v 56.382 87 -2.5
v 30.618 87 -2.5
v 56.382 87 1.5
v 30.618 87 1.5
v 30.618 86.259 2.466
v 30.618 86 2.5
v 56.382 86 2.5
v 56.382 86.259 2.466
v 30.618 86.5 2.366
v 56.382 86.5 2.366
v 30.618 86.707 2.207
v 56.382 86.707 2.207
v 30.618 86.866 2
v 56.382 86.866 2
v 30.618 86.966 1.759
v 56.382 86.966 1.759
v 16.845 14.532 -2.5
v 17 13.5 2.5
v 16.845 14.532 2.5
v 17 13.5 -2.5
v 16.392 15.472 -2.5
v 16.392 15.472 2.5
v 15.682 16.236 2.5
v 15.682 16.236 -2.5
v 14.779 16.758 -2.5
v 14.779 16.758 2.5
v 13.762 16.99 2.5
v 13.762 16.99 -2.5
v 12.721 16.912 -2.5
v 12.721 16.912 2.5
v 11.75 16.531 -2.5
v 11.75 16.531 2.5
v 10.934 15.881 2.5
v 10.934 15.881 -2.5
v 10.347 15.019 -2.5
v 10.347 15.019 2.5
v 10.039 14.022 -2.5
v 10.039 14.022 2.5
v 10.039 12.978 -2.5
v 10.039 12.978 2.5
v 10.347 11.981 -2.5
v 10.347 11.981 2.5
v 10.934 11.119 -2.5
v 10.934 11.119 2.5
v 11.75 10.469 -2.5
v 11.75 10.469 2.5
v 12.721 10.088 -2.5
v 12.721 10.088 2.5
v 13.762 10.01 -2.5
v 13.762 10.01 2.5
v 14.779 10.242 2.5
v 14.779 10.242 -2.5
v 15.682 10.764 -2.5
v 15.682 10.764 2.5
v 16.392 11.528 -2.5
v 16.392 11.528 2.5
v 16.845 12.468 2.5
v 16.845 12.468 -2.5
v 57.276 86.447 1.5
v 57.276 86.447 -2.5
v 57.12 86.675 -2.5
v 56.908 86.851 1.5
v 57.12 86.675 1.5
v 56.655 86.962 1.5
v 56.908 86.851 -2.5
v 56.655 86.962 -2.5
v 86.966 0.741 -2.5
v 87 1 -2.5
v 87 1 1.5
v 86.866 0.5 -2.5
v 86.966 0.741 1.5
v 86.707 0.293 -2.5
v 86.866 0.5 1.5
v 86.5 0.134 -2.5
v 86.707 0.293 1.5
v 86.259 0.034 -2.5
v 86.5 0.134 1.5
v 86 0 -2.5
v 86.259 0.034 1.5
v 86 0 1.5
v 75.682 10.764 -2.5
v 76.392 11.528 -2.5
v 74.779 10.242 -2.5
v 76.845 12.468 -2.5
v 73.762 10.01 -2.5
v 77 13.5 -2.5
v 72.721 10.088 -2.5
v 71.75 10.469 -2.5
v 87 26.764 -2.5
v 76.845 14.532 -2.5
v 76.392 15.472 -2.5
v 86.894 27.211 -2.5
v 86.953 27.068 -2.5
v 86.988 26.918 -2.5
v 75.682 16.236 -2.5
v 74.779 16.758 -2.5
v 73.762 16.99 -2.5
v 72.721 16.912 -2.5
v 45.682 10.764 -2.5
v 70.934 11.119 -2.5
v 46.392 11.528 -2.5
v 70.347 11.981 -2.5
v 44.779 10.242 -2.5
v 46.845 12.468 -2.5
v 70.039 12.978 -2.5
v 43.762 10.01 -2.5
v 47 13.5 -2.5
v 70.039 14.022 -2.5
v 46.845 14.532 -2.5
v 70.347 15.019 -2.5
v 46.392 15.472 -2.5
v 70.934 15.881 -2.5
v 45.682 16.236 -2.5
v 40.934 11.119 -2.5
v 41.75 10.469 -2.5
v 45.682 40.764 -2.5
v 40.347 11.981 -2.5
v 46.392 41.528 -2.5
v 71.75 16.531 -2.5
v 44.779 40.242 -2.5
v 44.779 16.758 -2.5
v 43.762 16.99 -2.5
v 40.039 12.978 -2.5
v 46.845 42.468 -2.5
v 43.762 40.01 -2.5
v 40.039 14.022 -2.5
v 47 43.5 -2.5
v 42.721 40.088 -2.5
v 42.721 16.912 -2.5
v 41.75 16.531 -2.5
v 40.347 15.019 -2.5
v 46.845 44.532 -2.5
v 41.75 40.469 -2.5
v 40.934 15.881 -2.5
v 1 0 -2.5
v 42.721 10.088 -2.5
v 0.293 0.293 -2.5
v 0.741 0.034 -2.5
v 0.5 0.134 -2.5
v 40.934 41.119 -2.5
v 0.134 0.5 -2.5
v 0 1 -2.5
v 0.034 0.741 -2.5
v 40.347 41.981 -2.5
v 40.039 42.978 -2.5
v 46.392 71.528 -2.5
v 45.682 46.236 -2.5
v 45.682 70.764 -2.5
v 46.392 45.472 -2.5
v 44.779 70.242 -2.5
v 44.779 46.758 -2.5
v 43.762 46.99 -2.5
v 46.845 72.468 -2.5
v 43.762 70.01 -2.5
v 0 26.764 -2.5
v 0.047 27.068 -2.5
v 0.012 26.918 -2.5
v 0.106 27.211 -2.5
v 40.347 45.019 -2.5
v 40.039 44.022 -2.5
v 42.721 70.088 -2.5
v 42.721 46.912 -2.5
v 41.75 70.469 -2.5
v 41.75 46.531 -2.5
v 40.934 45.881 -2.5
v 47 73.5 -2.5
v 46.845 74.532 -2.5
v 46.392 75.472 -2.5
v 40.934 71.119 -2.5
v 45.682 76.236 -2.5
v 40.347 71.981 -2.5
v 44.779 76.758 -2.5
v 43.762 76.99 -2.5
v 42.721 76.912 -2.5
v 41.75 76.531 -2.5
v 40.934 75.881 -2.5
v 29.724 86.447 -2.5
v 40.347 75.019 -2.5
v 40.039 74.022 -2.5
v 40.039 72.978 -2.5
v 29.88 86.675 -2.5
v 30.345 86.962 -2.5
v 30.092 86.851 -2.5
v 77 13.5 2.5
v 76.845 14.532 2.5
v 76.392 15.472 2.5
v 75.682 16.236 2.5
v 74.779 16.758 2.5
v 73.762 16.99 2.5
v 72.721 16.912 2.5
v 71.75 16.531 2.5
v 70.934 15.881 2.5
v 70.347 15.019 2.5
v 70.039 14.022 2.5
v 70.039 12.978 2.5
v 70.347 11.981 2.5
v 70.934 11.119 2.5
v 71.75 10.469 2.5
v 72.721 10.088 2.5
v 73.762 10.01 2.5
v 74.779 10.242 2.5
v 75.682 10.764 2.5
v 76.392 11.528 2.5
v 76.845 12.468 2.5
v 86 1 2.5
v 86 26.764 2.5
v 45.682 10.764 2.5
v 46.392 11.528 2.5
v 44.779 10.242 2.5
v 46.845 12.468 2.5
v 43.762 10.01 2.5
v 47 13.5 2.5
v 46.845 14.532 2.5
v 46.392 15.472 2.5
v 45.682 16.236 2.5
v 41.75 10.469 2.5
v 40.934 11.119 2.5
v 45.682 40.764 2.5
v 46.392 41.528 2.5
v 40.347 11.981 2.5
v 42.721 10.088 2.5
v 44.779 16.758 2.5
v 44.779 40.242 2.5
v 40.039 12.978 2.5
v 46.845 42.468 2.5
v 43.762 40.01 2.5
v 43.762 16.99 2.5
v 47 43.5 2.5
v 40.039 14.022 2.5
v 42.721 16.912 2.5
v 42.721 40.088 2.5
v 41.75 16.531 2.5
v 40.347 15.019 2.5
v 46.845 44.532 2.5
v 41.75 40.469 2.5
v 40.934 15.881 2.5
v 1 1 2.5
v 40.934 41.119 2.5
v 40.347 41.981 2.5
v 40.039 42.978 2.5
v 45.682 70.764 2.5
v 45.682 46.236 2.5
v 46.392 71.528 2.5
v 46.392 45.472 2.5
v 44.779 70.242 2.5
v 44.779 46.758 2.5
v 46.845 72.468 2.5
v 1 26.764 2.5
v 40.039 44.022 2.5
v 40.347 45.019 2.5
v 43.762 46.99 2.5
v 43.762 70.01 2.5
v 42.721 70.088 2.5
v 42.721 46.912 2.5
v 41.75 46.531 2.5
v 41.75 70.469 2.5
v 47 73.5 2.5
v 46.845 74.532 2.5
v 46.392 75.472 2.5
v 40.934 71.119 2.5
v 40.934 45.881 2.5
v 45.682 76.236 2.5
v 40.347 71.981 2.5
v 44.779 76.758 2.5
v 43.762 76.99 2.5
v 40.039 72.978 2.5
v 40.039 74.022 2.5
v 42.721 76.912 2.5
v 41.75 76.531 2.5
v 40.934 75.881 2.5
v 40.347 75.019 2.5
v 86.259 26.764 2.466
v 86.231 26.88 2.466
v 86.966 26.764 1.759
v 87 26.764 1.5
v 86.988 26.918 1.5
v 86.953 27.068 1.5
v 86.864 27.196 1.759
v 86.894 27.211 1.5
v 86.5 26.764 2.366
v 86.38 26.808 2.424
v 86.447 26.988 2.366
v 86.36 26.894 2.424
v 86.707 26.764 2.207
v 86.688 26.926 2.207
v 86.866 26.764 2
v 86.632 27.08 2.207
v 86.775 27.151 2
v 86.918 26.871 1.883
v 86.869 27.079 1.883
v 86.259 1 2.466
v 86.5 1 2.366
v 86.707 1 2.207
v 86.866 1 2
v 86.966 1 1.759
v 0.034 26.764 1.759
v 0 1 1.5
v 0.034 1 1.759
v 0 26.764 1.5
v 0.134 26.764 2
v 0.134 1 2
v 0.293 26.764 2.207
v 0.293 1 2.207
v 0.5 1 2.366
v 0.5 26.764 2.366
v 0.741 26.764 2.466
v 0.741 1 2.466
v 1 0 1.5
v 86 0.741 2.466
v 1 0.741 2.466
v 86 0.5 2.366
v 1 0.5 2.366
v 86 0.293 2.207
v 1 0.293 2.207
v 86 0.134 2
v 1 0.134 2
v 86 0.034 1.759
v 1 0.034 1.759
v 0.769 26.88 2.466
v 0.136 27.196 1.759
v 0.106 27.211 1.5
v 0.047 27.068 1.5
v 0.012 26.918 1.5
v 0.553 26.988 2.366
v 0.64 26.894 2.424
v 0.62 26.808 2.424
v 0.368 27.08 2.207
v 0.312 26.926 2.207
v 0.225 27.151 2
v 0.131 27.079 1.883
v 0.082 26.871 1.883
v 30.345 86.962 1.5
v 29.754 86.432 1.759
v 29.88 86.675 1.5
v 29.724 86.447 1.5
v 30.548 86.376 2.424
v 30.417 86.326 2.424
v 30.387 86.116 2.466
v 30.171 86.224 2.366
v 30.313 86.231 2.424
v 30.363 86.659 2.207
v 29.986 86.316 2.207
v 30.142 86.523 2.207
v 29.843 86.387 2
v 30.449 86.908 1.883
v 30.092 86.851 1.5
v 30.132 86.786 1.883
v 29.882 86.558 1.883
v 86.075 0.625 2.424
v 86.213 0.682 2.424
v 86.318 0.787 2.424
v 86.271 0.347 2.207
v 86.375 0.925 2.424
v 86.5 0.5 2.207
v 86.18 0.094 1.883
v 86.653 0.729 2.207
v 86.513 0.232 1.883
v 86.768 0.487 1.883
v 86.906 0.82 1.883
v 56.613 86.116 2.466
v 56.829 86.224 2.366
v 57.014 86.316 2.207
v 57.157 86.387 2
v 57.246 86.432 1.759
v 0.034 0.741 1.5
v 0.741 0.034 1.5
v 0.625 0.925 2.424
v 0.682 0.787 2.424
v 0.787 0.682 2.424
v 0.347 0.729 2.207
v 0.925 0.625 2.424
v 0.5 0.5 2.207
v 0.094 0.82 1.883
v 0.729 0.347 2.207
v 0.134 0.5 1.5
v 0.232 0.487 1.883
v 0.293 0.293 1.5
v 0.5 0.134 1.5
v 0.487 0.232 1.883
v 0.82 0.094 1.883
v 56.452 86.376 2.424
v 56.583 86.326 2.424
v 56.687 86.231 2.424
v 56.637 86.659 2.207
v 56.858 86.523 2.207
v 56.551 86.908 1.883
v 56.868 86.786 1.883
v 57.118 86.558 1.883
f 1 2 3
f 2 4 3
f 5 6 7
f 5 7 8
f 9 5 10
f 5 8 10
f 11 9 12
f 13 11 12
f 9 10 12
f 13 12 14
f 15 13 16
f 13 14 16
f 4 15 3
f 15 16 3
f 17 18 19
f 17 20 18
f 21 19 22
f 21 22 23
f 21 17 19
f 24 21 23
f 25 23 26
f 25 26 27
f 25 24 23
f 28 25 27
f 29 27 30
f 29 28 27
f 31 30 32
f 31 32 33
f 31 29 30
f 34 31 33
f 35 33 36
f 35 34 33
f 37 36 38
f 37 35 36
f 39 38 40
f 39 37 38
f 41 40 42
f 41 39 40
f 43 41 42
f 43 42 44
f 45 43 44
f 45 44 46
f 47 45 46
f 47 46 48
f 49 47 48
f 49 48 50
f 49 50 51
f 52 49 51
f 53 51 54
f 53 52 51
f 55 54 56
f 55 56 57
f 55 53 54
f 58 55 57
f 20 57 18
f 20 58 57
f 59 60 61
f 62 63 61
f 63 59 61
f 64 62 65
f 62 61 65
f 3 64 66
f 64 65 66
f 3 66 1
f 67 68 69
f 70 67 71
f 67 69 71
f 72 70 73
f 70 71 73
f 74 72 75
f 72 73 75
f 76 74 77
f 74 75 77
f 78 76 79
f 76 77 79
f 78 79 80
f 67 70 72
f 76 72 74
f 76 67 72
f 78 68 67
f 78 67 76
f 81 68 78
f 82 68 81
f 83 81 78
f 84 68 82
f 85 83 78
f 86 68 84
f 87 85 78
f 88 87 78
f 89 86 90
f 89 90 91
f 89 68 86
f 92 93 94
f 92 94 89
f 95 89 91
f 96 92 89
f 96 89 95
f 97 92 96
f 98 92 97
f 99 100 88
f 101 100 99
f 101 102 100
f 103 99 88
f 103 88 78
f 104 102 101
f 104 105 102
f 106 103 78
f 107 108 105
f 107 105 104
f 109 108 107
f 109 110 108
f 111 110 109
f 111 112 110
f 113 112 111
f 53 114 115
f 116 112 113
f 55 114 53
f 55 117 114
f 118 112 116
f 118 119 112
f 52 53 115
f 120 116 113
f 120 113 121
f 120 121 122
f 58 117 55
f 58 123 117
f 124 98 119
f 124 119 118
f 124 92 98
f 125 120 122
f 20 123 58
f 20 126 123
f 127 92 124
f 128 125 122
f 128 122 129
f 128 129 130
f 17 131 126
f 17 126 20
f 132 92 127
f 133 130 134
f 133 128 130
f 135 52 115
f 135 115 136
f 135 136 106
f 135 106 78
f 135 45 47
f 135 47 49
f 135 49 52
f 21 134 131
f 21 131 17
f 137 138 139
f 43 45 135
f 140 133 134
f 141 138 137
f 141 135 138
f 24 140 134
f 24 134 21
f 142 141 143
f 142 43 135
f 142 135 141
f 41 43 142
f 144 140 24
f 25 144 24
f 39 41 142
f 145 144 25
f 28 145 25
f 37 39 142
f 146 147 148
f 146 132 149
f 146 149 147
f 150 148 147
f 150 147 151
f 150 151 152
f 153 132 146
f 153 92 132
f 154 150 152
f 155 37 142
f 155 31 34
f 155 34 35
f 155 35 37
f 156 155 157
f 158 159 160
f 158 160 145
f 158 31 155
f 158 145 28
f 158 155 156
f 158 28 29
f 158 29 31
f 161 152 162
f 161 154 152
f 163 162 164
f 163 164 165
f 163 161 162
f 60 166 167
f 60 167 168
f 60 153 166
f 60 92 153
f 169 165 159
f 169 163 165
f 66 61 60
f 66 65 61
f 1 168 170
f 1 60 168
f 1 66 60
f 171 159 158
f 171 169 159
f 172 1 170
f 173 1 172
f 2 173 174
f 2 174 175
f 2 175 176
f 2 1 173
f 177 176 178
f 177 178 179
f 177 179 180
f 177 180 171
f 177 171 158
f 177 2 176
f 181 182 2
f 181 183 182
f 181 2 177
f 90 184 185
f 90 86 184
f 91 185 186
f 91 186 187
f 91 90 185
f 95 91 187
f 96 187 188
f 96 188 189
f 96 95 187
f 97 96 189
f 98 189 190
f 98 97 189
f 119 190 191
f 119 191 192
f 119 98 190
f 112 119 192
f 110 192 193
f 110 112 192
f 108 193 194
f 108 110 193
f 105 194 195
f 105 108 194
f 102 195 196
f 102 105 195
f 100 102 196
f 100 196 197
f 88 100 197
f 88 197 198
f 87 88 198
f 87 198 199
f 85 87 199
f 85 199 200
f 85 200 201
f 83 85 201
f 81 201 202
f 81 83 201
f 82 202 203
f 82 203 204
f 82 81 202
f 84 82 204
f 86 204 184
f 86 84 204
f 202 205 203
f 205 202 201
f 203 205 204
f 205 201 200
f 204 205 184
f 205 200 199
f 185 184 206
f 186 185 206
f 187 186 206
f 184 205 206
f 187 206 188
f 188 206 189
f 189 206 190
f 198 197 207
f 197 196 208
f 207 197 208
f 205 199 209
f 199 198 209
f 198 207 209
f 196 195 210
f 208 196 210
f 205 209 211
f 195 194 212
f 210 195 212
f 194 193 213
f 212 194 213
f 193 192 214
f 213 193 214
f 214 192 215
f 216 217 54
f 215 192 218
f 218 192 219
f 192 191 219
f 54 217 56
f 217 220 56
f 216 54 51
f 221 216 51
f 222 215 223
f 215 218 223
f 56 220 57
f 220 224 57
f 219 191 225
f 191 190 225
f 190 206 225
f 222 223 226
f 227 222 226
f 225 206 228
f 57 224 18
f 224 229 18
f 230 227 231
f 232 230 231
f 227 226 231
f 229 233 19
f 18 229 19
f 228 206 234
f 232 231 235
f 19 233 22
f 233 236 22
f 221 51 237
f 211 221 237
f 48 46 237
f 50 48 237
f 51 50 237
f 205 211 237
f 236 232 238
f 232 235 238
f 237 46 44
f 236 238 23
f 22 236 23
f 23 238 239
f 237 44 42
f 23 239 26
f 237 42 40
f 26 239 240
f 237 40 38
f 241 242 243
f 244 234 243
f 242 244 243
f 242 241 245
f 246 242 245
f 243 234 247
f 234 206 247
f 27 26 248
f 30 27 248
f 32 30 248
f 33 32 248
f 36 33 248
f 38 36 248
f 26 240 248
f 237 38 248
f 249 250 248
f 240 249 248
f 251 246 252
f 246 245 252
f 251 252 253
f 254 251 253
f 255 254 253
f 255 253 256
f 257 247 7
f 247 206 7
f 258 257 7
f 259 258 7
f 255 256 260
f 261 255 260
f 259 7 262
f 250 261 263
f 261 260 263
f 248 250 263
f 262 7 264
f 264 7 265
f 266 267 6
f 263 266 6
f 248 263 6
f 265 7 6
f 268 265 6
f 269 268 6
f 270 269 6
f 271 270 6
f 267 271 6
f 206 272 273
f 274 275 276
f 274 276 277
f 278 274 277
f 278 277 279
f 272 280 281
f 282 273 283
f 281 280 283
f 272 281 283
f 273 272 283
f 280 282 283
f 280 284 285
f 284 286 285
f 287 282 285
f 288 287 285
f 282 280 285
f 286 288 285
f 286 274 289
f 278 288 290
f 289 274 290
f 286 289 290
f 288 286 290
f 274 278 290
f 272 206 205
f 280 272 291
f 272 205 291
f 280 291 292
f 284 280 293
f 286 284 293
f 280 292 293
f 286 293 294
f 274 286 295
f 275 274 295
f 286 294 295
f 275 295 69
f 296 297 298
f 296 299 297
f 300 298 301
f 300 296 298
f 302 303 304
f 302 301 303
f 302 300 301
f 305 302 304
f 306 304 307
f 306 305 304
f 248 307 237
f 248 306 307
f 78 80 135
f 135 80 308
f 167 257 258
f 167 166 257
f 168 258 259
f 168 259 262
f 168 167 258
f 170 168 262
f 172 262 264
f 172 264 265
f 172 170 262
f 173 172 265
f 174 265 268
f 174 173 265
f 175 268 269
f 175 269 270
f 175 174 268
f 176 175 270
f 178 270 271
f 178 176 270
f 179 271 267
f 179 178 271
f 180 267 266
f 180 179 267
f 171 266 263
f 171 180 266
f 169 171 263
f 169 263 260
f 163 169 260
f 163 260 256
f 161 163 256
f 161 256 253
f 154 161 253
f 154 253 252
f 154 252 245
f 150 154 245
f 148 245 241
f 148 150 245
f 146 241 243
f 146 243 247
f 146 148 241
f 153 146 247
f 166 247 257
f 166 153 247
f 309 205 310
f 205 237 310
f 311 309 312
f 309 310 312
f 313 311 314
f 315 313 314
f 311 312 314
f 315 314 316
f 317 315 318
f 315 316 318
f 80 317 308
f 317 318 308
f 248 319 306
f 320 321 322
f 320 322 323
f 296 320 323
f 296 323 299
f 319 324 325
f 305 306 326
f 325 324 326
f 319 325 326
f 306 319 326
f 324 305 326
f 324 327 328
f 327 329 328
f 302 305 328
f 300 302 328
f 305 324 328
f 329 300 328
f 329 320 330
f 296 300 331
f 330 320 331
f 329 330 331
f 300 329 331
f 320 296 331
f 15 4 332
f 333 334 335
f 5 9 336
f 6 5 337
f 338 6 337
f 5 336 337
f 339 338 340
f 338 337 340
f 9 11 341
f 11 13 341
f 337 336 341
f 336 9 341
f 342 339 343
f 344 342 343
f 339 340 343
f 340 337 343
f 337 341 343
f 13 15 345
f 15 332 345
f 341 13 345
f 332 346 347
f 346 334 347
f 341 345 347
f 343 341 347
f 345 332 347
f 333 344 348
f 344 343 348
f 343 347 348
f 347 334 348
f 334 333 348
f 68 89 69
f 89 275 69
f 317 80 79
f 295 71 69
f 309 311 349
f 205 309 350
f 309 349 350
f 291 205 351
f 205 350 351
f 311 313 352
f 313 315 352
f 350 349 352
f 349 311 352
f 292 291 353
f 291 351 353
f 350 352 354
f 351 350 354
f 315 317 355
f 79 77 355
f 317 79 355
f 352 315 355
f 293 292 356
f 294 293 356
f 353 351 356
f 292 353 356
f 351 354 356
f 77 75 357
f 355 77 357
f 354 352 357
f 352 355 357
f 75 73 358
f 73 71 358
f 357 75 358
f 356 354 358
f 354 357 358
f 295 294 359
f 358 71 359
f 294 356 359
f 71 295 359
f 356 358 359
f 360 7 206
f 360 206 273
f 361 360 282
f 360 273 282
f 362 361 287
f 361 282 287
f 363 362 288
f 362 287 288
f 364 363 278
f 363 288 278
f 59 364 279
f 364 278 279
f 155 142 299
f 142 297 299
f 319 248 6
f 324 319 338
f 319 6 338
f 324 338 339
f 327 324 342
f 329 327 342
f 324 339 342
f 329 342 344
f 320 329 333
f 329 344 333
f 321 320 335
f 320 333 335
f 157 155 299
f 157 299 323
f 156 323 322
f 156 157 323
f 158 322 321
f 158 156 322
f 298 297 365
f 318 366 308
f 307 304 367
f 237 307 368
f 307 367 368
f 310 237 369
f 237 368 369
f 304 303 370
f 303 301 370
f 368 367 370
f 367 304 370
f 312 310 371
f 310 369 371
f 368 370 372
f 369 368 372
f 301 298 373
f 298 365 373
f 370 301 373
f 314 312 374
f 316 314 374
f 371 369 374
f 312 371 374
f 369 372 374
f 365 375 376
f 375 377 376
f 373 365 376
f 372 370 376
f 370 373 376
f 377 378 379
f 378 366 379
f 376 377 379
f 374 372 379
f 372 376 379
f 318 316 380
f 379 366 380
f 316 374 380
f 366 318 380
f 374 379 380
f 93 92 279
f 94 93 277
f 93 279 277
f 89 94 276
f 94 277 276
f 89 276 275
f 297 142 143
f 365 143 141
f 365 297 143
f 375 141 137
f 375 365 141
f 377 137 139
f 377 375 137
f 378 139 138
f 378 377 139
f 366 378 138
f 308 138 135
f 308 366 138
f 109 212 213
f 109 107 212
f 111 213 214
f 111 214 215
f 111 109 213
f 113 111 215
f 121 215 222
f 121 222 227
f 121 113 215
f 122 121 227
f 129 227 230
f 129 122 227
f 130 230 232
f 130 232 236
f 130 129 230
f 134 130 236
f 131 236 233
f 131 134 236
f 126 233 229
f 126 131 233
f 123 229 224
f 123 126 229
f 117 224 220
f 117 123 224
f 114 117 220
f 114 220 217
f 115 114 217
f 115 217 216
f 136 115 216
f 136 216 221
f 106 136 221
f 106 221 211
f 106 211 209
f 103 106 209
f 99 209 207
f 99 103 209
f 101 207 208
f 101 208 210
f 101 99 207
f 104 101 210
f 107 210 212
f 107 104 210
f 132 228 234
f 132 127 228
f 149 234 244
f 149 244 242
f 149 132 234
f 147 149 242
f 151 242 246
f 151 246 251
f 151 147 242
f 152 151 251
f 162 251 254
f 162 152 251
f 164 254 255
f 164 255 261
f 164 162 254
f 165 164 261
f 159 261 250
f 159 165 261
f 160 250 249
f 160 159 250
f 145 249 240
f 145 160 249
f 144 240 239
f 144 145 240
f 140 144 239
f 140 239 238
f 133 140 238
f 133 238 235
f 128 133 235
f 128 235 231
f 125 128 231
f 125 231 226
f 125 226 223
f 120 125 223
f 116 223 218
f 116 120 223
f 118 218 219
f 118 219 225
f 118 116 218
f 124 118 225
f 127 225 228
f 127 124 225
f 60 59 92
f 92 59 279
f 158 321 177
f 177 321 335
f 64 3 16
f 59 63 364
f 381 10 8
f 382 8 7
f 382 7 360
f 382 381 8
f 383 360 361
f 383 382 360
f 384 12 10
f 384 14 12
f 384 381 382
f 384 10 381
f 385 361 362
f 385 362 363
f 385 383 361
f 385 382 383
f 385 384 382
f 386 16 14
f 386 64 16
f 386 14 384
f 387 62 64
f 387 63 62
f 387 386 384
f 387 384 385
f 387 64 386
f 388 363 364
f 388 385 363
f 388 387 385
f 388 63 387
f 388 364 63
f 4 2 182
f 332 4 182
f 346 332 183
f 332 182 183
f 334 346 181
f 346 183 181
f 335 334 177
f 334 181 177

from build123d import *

# Parameters (mm, degrees)
SKETCH1_R           = 3.5
BOSS_EXTRUDE1_DEPTH = 2.5
FILLET1_R           = 1


with BuildPart() as part:
    # Sketch1 → Boss-Extrude1 (new body, symmetric)
    with BuildSketch(Plane.XY):
        Polygon((0, 0), (0, 27), (30, 87), (57, 87), (87, 27), (87, 0), align=None)
        with Locations((13.5, 13.5)):
            Circle(SKETCH1_R, mode=Mode.SUBTRACT)
        with Locations((43.5, 13.5)):
            Circle(SKETCH1_R, mode=Mode.SUBTRACT)
        with Locations((73.5, 13.5)):
            Circle(SKETCH1_R, mode=Mode.SUBTRACT)
        with Locations((43.5, 43.5)):
            Circle(SKETCH1_R, mode=Mode.SUBTRACT)
        with Locations((43.5, 73.5)):
            Circle(SKETCH1_R, mode=Mode.SUBTRACT)
    extrude(amount=BOSS_EXTRUDE1_DEPTH, both=True)

    # Fillet1
    fillet1_edges = [part.edges().sort_by_distance(p)[0] for p in [
        (72, 57, 2.5),
        (0, 0, 0),
        (0, 27, 0),
        (30, 87, 0),
        (57, 87, 0),
        (87, 27, 0),
        (87, 0, 0),
        (43.5, 87, 2.5),
        (15, 57, 2.5),
        (0, 13.5, 2.5),
        (43.5, 0, 2.5),
        (87, 13.5, 2.5),
    ]]
    fillet(fillet1_edges, radius=FILLET1_R)


solid = part.part
